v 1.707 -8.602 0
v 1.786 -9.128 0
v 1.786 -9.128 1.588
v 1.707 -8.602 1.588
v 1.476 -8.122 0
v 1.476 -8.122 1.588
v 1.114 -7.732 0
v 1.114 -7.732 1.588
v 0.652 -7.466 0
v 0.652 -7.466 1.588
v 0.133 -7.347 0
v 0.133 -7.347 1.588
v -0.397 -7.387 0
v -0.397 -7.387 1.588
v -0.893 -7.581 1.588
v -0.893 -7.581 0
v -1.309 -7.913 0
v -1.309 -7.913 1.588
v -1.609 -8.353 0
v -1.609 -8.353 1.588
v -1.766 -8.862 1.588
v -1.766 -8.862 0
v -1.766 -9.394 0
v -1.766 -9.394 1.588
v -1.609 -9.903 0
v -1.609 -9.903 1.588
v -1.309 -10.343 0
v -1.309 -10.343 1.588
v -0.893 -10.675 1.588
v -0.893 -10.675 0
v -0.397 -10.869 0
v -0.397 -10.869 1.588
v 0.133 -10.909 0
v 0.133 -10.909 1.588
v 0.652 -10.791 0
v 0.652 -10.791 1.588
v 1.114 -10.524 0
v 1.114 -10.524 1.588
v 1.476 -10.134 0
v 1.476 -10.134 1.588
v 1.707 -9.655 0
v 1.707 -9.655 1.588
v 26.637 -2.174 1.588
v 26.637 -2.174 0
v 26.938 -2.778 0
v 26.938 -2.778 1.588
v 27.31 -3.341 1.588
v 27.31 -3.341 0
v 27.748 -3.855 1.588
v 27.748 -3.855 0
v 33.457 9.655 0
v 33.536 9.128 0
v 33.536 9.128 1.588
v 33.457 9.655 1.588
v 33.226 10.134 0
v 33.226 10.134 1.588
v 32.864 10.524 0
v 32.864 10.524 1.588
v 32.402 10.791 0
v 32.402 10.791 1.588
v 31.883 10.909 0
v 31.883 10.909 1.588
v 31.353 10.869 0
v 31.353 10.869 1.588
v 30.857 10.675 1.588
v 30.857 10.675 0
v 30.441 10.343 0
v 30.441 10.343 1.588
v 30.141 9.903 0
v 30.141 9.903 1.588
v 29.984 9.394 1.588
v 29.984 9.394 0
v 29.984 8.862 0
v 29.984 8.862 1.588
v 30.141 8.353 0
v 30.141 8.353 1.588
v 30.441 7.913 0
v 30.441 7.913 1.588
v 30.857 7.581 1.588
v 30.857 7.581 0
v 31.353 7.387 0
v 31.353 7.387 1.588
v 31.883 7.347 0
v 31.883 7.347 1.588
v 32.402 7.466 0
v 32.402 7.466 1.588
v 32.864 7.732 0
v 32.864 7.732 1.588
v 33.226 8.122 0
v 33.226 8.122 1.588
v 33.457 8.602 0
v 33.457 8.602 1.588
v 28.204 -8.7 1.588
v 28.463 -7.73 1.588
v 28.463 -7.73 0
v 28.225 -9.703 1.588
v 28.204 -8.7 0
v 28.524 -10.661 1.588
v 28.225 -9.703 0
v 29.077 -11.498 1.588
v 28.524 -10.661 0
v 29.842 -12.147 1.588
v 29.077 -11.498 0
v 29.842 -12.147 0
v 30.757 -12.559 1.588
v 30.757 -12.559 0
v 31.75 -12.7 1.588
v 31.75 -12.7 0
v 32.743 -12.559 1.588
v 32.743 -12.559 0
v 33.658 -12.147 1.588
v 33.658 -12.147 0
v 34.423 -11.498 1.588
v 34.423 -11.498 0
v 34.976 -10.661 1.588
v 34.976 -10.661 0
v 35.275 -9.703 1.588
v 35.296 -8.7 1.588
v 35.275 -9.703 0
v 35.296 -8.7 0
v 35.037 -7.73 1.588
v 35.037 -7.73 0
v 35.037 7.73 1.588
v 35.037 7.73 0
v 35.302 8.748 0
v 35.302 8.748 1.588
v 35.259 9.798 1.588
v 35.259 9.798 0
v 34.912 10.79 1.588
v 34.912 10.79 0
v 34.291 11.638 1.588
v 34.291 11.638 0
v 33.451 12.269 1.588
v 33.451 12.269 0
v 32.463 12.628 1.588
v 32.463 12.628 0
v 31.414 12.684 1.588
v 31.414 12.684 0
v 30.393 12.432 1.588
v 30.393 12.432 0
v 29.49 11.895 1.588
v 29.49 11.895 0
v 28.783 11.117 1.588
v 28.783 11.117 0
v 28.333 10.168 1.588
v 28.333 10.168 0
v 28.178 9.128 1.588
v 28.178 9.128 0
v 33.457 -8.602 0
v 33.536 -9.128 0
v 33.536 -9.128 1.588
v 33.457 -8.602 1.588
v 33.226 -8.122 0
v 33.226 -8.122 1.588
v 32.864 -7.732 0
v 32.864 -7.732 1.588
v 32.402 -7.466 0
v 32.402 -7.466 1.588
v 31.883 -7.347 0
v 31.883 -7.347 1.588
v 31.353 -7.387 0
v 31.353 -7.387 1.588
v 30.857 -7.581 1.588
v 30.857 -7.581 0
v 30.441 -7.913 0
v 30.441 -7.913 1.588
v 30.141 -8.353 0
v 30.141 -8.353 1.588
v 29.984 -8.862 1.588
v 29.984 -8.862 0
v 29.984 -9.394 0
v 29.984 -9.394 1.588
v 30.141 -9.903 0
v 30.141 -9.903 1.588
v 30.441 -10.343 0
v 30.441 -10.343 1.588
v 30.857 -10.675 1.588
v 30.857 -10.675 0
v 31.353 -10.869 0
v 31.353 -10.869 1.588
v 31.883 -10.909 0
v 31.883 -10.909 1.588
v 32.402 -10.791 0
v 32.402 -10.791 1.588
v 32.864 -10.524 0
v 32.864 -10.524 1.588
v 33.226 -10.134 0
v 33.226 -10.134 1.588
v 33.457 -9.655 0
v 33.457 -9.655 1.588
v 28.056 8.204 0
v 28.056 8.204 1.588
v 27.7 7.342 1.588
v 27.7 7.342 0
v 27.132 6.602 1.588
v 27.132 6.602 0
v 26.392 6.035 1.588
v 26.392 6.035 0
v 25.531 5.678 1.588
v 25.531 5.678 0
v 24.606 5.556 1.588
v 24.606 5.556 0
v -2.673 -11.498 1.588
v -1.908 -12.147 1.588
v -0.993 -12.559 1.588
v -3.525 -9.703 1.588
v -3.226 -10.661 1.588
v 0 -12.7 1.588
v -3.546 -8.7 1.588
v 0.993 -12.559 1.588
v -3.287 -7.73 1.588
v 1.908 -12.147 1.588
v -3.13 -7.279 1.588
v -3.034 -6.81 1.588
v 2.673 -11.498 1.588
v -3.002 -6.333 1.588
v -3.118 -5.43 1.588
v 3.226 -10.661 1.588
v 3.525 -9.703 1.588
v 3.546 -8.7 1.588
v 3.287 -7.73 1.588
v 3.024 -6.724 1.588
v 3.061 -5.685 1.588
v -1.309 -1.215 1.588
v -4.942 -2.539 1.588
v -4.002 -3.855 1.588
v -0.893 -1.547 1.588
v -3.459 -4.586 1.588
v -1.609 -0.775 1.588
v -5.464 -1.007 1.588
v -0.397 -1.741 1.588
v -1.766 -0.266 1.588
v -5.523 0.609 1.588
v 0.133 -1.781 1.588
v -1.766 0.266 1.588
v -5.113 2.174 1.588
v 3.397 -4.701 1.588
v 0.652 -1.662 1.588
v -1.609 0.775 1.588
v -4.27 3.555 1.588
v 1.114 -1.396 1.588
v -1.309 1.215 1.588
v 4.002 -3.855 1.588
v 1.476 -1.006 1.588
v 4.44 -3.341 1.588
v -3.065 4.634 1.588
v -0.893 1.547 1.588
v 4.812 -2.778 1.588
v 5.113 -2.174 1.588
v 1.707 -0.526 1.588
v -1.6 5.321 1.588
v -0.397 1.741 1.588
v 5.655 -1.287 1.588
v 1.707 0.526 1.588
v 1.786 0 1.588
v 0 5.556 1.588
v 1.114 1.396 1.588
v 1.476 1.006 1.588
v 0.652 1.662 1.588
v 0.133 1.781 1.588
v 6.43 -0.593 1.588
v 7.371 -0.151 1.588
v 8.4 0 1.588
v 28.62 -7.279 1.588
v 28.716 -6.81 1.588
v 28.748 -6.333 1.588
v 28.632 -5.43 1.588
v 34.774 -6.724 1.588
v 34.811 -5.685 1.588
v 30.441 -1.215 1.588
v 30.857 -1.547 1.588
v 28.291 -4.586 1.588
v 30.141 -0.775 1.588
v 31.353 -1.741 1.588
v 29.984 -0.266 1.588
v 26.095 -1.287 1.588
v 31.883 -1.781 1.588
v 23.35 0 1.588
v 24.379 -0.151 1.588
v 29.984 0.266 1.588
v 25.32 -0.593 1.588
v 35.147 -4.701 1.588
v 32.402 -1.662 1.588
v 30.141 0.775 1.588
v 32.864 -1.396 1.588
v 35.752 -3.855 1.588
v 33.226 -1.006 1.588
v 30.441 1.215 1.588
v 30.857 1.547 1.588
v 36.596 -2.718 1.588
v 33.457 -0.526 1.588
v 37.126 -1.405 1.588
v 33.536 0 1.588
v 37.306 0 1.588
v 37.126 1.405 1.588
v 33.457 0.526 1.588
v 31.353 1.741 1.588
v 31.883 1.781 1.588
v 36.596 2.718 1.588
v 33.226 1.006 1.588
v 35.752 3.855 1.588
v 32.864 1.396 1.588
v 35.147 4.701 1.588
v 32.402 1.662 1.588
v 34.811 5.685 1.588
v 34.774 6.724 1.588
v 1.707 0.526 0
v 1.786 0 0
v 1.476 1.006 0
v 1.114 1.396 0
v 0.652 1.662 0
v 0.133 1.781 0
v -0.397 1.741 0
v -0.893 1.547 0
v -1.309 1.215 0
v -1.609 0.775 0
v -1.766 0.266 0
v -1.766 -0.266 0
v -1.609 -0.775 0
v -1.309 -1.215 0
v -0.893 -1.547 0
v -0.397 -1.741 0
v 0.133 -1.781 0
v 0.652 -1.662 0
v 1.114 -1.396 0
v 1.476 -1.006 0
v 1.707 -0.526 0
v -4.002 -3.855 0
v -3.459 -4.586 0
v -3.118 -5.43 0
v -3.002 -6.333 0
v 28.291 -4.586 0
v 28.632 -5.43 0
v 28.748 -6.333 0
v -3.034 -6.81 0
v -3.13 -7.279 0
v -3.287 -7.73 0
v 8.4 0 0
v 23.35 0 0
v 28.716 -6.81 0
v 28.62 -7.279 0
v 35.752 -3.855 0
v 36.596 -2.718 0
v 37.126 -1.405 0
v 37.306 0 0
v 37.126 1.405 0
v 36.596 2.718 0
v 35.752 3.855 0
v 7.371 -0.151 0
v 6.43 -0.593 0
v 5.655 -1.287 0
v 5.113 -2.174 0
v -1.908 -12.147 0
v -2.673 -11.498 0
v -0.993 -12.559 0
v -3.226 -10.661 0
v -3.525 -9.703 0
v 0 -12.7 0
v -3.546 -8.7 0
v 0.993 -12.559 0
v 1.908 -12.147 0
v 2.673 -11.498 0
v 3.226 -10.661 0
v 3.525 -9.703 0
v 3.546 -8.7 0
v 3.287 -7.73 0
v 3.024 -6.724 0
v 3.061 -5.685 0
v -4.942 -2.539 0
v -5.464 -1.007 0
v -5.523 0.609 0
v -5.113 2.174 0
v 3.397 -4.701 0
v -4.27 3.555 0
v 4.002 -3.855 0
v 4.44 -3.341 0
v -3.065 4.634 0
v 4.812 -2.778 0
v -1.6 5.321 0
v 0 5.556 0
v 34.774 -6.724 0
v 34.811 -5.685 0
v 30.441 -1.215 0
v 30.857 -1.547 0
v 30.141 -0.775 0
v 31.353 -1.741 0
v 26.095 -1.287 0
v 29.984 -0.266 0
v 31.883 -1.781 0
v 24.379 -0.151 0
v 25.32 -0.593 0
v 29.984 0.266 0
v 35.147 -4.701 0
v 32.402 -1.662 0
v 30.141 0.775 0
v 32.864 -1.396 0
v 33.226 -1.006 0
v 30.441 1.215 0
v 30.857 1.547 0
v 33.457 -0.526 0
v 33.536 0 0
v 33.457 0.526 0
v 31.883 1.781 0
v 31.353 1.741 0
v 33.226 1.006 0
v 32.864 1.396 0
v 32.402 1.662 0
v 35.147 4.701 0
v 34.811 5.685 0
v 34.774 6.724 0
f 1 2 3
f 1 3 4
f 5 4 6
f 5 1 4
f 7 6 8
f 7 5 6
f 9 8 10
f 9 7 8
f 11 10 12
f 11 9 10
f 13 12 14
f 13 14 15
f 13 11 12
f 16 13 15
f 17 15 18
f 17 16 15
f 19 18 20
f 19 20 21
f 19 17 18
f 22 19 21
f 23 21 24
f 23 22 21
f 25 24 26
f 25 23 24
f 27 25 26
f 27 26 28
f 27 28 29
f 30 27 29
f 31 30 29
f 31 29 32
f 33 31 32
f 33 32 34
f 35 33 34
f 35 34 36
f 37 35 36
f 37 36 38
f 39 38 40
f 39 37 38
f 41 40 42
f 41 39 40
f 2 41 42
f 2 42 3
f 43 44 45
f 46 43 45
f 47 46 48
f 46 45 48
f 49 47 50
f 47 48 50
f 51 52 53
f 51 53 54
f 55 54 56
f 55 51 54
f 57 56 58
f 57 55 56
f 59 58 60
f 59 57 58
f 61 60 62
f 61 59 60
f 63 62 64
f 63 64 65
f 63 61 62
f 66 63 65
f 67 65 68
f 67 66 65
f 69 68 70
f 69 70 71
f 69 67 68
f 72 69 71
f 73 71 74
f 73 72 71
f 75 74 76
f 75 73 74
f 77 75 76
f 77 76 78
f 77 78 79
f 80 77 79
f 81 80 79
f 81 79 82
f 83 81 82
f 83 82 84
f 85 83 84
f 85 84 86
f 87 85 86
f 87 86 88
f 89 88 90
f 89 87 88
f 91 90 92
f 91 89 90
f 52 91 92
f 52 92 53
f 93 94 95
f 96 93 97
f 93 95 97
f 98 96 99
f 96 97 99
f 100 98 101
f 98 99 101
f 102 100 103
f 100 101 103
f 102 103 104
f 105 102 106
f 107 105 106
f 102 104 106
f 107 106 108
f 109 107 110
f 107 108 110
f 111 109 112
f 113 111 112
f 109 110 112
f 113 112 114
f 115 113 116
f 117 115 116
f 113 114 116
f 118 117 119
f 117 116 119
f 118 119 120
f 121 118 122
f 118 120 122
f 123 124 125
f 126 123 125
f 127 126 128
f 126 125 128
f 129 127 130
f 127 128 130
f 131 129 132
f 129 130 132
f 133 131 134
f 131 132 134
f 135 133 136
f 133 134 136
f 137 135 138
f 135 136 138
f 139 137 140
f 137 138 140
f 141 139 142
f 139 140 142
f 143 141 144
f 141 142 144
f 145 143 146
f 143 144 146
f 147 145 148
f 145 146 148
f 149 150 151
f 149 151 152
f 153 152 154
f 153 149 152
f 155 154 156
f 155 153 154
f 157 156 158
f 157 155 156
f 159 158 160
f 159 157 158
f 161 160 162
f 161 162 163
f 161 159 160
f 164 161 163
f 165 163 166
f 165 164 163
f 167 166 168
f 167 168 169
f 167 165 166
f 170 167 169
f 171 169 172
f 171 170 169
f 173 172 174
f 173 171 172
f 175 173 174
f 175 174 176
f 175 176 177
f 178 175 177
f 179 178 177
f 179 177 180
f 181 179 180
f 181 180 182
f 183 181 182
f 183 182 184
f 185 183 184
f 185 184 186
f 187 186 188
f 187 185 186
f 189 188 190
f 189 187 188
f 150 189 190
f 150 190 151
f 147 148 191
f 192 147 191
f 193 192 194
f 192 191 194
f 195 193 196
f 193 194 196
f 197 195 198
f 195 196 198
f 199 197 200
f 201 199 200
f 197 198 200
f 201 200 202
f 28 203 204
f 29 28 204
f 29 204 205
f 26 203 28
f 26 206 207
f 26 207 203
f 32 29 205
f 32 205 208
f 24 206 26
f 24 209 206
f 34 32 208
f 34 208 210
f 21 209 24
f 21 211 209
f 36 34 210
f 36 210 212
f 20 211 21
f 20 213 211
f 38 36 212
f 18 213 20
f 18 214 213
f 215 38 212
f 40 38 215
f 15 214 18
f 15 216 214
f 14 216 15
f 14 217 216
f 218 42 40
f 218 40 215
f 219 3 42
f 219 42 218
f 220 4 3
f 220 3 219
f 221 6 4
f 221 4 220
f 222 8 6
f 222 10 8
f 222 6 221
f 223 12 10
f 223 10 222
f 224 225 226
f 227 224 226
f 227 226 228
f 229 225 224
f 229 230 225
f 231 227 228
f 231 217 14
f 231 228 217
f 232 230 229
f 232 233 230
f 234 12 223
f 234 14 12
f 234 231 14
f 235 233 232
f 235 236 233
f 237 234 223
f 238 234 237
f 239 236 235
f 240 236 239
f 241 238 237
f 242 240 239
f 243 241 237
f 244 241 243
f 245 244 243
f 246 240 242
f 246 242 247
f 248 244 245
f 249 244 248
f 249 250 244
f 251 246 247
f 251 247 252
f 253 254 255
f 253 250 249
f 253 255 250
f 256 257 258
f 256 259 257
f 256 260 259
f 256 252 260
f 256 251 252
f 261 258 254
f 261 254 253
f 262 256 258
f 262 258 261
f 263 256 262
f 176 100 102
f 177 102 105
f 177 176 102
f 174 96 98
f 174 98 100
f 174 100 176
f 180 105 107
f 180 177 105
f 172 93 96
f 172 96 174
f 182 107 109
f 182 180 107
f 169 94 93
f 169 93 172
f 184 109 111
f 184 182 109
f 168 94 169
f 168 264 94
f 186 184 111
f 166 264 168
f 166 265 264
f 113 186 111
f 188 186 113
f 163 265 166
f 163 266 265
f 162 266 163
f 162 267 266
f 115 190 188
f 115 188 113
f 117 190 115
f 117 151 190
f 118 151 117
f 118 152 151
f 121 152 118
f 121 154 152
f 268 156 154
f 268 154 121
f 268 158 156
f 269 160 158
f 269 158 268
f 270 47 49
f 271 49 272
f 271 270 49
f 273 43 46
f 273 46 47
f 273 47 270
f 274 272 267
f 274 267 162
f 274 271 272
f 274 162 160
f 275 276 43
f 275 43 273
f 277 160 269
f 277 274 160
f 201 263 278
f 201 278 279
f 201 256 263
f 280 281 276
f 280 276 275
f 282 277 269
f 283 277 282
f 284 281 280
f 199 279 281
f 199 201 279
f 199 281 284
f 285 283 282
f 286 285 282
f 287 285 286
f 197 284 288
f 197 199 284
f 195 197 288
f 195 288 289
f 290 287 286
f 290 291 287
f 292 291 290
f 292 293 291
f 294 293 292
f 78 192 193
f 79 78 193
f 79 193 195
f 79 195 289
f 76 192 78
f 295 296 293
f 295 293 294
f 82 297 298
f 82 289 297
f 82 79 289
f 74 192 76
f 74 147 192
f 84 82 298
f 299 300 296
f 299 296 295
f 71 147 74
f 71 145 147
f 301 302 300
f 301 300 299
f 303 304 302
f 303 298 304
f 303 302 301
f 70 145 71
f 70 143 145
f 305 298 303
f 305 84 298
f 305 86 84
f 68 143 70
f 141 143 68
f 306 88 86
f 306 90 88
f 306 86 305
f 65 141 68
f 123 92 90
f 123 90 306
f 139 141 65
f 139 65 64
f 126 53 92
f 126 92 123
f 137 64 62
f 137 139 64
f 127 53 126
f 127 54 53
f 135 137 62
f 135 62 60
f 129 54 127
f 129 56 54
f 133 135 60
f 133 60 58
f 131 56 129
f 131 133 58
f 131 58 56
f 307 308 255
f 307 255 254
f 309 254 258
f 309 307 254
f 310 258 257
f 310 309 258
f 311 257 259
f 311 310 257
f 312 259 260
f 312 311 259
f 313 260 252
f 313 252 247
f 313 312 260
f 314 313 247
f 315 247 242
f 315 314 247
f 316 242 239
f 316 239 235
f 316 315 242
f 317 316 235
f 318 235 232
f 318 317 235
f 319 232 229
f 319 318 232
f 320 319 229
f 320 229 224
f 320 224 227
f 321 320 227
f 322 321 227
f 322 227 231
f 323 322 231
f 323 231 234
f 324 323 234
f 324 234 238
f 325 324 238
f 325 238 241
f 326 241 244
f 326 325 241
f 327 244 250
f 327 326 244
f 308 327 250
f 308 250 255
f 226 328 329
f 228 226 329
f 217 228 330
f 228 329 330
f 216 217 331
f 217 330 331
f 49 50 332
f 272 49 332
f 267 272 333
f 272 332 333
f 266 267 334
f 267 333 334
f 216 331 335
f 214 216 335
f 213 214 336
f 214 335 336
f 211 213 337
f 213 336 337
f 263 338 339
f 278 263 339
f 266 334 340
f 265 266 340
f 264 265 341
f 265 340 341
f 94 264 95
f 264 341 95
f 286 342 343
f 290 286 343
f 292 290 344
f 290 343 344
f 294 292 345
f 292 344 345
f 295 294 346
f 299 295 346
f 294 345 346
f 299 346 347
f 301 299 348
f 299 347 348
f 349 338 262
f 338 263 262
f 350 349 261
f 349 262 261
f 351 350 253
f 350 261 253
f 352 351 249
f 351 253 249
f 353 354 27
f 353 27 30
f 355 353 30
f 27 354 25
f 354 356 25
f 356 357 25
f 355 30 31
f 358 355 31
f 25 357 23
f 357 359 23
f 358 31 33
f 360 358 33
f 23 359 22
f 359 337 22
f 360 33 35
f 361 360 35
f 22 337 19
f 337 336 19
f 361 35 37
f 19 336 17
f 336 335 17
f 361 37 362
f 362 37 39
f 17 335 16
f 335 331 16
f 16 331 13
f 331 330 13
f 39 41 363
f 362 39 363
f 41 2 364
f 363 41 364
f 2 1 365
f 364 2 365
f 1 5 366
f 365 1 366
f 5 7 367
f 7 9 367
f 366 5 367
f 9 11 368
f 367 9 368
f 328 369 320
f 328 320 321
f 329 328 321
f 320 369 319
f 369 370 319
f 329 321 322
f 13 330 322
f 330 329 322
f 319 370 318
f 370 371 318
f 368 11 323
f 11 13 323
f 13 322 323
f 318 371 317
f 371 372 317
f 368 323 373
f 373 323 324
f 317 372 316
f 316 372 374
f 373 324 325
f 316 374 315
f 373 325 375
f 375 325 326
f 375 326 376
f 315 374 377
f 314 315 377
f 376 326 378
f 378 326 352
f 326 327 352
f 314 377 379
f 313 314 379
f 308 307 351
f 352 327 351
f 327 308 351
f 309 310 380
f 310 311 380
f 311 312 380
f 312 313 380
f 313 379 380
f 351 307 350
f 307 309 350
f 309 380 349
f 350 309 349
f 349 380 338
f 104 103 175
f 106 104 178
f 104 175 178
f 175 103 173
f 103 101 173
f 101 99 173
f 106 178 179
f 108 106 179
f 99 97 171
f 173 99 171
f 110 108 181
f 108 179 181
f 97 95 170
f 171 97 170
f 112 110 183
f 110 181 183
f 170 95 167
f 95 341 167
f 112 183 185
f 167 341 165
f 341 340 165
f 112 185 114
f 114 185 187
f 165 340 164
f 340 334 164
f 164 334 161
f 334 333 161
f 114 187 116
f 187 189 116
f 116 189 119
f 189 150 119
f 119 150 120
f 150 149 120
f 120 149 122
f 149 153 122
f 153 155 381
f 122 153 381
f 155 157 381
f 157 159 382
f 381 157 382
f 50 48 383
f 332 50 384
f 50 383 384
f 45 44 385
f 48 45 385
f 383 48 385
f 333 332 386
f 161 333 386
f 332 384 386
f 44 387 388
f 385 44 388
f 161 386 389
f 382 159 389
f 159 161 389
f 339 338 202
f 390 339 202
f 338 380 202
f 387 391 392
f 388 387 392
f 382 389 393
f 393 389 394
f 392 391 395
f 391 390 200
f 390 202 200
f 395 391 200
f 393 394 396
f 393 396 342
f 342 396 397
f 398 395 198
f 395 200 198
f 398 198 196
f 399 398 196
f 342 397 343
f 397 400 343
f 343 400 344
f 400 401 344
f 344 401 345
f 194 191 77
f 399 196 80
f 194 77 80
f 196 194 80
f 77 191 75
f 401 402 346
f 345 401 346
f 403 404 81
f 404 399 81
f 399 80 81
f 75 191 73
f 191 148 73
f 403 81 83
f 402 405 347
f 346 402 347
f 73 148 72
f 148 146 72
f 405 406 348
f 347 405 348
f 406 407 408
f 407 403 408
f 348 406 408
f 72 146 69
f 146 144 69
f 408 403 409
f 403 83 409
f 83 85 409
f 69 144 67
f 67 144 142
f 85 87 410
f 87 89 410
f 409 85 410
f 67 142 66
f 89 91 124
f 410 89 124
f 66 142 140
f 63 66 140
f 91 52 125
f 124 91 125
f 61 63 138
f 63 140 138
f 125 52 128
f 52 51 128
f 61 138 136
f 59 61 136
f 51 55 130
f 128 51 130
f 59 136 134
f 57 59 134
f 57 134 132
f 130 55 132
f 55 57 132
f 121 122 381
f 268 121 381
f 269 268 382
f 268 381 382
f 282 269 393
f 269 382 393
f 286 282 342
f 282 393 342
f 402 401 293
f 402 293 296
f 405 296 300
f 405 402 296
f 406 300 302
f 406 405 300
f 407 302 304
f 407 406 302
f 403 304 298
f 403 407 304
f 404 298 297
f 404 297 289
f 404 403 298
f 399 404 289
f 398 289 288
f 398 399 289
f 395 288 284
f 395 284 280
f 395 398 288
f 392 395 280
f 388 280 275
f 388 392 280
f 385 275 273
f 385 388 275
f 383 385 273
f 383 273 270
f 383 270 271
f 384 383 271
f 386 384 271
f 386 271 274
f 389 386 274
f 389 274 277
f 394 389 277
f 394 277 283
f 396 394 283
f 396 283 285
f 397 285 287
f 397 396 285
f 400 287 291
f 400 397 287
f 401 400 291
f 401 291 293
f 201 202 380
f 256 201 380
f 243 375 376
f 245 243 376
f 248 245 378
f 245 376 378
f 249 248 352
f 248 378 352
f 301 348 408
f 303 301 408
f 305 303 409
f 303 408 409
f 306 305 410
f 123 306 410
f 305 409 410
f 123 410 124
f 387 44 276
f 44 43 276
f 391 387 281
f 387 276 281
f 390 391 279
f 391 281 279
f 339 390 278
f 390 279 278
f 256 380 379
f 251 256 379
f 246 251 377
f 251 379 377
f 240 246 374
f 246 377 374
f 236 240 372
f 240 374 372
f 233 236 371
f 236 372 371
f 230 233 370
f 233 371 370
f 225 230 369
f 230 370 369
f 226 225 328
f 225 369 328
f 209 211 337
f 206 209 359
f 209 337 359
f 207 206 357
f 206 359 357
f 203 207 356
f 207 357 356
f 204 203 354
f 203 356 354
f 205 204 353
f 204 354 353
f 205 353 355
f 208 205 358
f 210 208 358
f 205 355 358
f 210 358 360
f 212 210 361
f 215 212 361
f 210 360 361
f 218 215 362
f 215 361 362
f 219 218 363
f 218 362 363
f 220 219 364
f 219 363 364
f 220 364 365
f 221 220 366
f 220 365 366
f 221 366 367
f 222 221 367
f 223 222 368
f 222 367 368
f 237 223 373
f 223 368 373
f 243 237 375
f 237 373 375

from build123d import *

# Parameters (mm, degrees)
SKETCH1_R           = 1.7859375
SKETCH1_R_2         = 3.571875
BOSS_EXTRUDE1_DEPTH = 1.5875
FILLET1_R           = 3.571875


with BuildPart() as part:
    # Sketch1 → Boss-Extrude1 (new body)
    # profile 1 of 10: a face of its own
    with BuildSketch(Plane.XY):
        with BuildLine():
            Line((5.55625, 0), (26.19375, 0))
            ThreePointArc((26.19375, 0), (27.821137947, -3.928862053), (31.75, -5.55625))
            ThreePointArc((31.75, -5.55625), (37.30625, 0), (31.75, 5.55625))
            Line((31.75, 5.55625), (0, 5.55625))
            ThreePointArc((0, 5.55625), (-5.55625, 0), (0, -5.55625))
            ThreePointArc((0, -5.55625), (3.928862053, -3.928862053), (5.55625, 0))
        make_face()
        Circle(SKETCH1_R, mode=Mode.SUBTRACT)
        with Locations((31.75, 0)):
            Circle(SKETCH1_R, mode=Mode.SUBTRACT)
    # profile 2 of 10: a face of its own
    with BuildSketch(Plane.XY):
        with Locations((0, -9.128125)):
            Circle(SKETCH1_R_2)
        with Locations((0, -9.128125)):
            Circle(SKETCH1_R, mode=Mode.SUBTRACT)
    # profile 3 of 10: a face of its own
    with BuildSketch(Plane.XY):
        with Locations((31.75, -9.128125)):
            Circle(SKETCH1_R_2)
        with Locations((31.75, -9.128125)):
            Circle(SKETCH1_R, mode=Mode.SUBTRACT)
    # profile 4 of 10: a face of its own
    with BuildSketch(Plane.XY):
        with Locations((31.75, 9.128125)):
            Circle(SKETCH1_R_2)
        with Locations((31.75, 9.128125)):
            Circle(SKETCH1_R, mode=Mode.SUBTRACT)
    # profile 5 of 10: a face of its own
    with BuildSketch(Plane.XY):
        with BuildLine():
            ThreePointArc((28.178125, 9.128125), (27.131947034, 6.602427966), (24.60625, 5.55625))
            Line((24.60625, 5.55625), (31.75, 5.55625))
            ThreePointArc((31.75, 5.55625), (29.224302966, 6.602427966), (28.178125, 9.128125))
        make_face()
    # profile 6 of 10: a face of its own
    with BuildSketch(Plane.XY):
        with BuildLine():
            ThreePointArc((31.75, 5.55625), (33.924184828, 5.113201971), (35.751636409, 3.854714012))
            ThreePointArc((35.751636409, 3.854714012), (34.811446668, 5.68510327), (35.037058415, 7.730434766))
            ThreePointArc((35.037058415, 7.730434766), (33.720522292, 6.148975304), (31.75, 5.55625))
        make_face()
    # profile 7 of 10: a face of its own
    with BuildSketch(Plane.XY):
        with BuildLine():
            ThreePointArc((35.751636291, -3.854714135), (33.92418475, -5.113202004), (31.75, -5.55625))
            ThreePointArc((31.75, -5.55625), (33.720522308, -6.148975314), (35.037058429, -7.730434799))
            ThreePointArc((35.037058429, -7.730434799), (34.811446649, -5.685103372), (35.751636291, -3.854714135))
        make_face()
    # profile 8 of 10: a face of its own
    with BuildSketch(Plane.XY):
        with BuildLine():
            ThreePointArc((31.75, -5.55625), (29.575815225, -5.113201993), (27.748363671, -3.854714095))
            ThreePointArc((27.748363671, -3.854714095), (28.48850069, -4.996759503), (28.747758155, -6.332744565))
            ThreePointArc((28.747758155, -6.332744565), (28.675829783, -7.045951842), (28.462941571, -7.730434799))
            ThreePointArc((28.462941571, -7.730434799), (29.779477692, -6.148975314), (31.75, -5.55625))
        make_face()
    # profile 9 of 10: a face of its own
    with BuildSketch(Plane.XY):
        with BuildLine():
            ThreePointArc((3.287058481, -7.730434921), (3.061446618, -5.685103543), (4.001636142, -3.854714289))
            ThreePointArc((4.001636142, -3.854714289), (2.174184651, -5.113202046), (0, -5.55625))
            ThreePointArc((0, -5.55625), (1.970522363, -6.148975351), (3.287058481, -7.730434921))
        make_face()
    # profile 10 of 10: a face of its own
    with BuildSketch(Plane.XY):
        with BuildLine():
            ThreePointArc((-3.287058429, -7.730434799), (-1.970522308, -6.148975314), (0, -5.55625))
            ThreePointArc((0, -5.55625), (-2.174184798, -5.113201984), (-4.001636364, -3.854714059))
            ThreePointArc((-4.001636364, -3.854714059), (-3.26149932, -4.99675948), (-3.002241845, -6.332744565))
            ThreePointArc((-3.002241845, -6.332744565), (-3.074170217, -7.045951842), (-3.287058429, -7.730434799))
        make_face()
    extrude(amount=BOSS_EXTRUDE1_DEPTH)

    # Fillet1
    fillet1_edges = [part.edges().sort_by_distance(p)[0] for p in [
        (26.19375, 0, 0.79375),
        (5.55625, 0, 0.79375),
    ]]
    fillet(fillet1_edges, radius=FILLET1_R)


solid = part.part
